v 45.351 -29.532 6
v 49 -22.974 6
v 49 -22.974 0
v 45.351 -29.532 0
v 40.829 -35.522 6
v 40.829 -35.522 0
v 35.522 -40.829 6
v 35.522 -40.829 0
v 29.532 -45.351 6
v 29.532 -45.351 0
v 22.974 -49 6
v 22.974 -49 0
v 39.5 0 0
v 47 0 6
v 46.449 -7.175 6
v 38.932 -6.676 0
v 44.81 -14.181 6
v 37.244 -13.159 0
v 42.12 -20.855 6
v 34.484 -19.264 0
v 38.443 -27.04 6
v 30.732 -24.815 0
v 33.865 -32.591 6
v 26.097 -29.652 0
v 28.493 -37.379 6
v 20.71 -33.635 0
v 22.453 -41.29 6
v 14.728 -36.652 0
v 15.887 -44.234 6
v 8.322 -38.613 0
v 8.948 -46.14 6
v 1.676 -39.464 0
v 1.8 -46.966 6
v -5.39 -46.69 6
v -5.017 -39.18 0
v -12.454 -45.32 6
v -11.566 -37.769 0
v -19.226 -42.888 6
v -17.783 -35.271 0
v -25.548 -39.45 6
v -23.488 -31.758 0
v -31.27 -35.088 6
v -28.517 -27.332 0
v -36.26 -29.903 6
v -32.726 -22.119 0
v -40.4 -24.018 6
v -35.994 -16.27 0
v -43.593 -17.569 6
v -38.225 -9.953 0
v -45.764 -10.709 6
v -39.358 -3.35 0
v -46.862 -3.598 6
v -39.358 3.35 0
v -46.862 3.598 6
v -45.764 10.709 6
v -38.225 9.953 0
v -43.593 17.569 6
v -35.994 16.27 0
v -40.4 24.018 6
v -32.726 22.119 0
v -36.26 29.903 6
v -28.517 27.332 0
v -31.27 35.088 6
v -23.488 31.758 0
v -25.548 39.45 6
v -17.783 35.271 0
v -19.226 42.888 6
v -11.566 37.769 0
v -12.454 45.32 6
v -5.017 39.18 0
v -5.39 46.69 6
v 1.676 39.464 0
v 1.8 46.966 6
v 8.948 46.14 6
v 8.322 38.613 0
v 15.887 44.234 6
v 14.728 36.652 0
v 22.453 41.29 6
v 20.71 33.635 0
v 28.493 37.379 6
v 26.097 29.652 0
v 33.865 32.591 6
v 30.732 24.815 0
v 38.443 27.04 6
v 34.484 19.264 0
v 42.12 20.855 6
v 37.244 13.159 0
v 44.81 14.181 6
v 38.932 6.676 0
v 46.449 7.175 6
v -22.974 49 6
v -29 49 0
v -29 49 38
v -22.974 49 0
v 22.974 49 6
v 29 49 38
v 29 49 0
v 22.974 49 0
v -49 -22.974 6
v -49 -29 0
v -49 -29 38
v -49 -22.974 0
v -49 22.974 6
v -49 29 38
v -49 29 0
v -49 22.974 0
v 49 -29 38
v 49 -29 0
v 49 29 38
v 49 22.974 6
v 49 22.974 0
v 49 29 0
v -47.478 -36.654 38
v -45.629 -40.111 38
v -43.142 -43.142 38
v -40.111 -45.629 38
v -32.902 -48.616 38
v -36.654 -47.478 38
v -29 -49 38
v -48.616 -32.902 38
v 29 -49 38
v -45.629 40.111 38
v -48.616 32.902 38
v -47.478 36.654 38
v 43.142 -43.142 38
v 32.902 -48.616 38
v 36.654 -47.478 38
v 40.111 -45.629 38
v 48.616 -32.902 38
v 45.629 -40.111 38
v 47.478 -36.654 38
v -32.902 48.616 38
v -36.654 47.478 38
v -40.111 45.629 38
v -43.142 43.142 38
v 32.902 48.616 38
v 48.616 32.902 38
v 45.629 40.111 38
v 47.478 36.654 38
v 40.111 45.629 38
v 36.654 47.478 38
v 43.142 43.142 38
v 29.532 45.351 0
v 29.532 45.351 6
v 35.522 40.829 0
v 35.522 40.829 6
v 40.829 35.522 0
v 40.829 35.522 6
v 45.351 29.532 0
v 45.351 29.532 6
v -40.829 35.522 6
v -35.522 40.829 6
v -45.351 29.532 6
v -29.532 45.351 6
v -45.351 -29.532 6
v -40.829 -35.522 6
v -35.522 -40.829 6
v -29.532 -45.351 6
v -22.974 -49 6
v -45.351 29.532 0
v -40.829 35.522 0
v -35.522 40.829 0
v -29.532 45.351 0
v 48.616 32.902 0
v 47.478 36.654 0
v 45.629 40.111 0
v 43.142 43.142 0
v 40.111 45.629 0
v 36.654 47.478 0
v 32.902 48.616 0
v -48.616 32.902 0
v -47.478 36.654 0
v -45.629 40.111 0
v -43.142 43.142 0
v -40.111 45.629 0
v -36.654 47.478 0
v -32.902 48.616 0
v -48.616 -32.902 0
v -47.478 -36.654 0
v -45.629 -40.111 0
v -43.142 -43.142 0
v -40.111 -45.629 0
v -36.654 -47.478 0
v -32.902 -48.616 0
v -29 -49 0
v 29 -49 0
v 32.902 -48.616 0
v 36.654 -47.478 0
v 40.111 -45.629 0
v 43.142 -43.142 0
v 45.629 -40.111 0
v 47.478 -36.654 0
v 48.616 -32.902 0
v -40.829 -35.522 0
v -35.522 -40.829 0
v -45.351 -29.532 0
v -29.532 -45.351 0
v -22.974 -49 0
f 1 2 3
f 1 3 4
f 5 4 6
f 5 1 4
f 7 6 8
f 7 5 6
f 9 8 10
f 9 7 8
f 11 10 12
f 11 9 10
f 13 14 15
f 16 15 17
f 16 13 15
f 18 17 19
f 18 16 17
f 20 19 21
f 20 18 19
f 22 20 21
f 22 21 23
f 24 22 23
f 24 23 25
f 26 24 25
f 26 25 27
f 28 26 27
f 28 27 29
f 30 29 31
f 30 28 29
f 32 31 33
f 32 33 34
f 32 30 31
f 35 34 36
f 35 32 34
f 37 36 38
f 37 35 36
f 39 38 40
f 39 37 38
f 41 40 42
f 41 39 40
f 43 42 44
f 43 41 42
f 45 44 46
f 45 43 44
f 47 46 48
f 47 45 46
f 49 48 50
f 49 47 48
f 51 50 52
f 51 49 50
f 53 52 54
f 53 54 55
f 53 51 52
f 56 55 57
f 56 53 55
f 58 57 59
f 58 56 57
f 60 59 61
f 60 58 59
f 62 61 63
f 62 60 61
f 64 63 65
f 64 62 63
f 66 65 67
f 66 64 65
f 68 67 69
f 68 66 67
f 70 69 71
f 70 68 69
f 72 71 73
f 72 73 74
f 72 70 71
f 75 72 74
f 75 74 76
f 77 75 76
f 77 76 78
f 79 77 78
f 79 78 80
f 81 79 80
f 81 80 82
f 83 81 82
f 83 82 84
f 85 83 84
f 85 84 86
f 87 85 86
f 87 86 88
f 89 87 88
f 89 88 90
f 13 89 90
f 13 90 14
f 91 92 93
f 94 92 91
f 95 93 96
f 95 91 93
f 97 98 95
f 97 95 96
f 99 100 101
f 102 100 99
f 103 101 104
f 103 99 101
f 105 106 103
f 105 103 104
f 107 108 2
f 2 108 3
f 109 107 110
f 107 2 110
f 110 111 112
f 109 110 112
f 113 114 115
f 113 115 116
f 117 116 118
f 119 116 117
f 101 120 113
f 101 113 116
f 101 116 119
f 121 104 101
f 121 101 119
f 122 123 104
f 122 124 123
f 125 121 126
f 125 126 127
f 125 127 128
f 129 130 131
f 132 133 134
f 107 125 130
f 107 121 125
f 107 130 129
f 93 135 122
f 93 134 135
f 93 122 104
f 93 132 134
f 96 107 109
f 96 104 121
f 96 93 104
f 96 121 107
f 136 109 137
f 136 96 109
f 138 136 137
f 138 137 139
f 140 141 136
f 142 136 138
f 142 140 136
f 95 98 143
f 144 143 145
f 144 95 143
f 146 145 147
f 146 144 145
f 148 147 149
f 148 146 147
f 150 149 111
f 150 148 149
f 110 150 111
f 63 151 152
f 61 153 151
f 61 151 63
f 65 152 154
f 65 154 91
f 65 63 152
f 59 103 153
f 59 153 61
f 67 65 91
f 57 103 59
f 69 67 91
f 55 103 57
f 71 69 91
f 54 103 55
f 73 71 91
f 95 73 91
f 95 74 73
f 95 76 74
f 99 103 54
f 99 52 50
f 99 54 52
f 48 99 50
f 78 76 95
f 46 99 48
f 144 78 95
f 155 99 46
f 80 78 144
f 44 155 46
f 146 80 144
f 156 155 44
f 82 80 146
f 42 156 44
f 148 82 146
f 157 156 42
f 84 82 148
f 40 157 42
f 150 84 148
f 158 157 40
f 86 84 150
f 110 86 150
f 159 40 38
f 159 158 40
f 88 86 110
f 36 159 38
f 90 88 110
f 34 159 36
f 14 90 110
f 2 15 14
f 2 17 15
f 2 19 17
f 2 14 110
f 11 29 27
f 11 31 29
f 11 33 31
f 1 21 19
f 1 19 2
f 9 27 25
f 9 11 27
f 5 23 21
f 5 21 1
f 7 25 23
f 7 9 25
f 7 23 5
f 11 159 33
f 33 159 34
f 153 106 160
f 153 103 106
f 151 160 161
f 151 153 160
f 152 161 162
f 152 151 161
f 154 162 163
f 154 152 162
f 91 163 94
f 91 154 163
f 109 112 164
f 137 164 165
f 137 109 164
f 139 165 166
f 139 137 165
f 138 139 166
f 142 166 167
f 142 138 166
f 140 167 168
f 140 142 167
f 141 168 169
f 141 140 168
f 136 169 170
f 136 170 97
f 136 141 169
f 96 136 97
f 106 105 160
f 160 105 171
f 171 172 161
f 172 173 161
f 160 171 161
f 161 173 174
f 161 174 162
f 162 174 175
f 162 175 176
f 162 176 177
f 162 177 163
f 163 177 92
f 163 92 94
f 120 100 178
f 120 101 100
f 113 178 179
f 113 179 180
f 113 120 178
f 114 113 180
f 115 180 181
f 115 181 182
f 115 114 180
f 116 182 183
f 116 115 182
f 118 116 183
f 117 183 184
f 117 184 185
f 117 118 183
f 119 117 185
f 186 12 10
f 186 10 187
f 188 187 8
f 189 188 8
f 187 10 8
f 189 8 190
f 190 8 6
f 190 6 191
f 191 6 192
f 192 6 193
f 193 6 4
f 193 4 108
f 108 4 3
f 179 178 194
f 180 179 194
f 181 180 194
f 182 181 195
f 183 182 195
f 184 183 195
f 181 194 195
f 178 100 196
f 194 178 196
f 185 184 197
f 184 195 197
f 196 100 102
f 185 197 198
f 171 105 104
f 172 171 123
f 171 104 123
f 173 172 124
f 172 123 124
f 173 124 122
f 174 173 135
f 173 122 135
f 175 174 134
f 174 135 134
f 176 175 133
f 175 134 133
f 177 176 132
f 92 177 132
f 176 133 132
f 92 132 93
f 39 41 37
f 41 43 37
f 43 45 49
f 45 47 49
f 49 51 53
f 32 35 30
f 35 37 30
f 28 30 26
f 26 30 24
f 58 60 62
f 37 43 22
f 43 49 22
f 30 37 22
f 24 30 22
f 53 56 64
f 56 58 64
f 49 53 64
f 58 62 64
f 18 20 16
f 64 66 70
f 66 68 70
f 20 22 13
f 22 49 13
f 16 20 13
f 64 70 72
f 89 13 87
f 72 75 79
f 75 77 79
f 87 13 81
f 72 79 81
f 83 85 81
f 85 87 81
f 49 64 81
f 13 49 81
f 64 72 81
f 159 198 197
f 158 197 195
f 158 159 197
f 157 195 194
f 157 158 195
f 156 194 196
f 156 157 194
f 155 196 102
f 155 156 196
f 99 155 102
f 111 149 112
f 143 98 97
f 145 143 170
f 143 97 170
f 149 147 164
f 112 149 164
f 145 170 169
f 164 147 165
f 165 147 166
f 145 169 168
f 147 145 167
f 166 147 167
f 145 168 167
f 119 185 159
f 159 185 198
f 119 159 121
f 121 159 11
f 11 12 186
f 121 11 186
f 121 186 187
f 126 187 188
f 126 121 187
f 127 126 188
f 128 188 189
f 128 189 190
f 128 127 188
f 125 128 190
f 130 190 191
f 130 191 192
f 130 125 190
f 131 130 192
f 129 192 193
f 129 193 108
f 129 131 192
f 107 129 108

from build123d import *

# Parameters (mm, degrees)
F0_W     = 98
F0_H     = 98
F1_DEPTH = 38
F2_R     = 20


with BuildPart() as f1:
    # F0 (on Top) → F1 (new body)
    with BuildSketch(Plane.XY):
        Rectangle(F0_W, F0_H)
    extrude(amount=F1_DEPTH)

    # F2
    f2_edges = [f1.edges().sort_by_distance(p)[0] for p in [
        (-49, 49, 19),
        (49, 49, 19),
        (49, -49, 19),
        (-49, -49, 19),
    ]]
    fillet(f2_edges, radius=F2_R)

    # F3 (on Front) → F4 (revolve, cut)
    with BuildSketch(Plane.XZ):
        Polygon((47, 6), (39.5, 0), (54.118488, 0), (54.118488, 6), align=None)
    revolve(axis=Axis((0, 0, 17.541468), (0, 0, -1)), mode=Mode.SUBTRACT)


solid = f1.part
